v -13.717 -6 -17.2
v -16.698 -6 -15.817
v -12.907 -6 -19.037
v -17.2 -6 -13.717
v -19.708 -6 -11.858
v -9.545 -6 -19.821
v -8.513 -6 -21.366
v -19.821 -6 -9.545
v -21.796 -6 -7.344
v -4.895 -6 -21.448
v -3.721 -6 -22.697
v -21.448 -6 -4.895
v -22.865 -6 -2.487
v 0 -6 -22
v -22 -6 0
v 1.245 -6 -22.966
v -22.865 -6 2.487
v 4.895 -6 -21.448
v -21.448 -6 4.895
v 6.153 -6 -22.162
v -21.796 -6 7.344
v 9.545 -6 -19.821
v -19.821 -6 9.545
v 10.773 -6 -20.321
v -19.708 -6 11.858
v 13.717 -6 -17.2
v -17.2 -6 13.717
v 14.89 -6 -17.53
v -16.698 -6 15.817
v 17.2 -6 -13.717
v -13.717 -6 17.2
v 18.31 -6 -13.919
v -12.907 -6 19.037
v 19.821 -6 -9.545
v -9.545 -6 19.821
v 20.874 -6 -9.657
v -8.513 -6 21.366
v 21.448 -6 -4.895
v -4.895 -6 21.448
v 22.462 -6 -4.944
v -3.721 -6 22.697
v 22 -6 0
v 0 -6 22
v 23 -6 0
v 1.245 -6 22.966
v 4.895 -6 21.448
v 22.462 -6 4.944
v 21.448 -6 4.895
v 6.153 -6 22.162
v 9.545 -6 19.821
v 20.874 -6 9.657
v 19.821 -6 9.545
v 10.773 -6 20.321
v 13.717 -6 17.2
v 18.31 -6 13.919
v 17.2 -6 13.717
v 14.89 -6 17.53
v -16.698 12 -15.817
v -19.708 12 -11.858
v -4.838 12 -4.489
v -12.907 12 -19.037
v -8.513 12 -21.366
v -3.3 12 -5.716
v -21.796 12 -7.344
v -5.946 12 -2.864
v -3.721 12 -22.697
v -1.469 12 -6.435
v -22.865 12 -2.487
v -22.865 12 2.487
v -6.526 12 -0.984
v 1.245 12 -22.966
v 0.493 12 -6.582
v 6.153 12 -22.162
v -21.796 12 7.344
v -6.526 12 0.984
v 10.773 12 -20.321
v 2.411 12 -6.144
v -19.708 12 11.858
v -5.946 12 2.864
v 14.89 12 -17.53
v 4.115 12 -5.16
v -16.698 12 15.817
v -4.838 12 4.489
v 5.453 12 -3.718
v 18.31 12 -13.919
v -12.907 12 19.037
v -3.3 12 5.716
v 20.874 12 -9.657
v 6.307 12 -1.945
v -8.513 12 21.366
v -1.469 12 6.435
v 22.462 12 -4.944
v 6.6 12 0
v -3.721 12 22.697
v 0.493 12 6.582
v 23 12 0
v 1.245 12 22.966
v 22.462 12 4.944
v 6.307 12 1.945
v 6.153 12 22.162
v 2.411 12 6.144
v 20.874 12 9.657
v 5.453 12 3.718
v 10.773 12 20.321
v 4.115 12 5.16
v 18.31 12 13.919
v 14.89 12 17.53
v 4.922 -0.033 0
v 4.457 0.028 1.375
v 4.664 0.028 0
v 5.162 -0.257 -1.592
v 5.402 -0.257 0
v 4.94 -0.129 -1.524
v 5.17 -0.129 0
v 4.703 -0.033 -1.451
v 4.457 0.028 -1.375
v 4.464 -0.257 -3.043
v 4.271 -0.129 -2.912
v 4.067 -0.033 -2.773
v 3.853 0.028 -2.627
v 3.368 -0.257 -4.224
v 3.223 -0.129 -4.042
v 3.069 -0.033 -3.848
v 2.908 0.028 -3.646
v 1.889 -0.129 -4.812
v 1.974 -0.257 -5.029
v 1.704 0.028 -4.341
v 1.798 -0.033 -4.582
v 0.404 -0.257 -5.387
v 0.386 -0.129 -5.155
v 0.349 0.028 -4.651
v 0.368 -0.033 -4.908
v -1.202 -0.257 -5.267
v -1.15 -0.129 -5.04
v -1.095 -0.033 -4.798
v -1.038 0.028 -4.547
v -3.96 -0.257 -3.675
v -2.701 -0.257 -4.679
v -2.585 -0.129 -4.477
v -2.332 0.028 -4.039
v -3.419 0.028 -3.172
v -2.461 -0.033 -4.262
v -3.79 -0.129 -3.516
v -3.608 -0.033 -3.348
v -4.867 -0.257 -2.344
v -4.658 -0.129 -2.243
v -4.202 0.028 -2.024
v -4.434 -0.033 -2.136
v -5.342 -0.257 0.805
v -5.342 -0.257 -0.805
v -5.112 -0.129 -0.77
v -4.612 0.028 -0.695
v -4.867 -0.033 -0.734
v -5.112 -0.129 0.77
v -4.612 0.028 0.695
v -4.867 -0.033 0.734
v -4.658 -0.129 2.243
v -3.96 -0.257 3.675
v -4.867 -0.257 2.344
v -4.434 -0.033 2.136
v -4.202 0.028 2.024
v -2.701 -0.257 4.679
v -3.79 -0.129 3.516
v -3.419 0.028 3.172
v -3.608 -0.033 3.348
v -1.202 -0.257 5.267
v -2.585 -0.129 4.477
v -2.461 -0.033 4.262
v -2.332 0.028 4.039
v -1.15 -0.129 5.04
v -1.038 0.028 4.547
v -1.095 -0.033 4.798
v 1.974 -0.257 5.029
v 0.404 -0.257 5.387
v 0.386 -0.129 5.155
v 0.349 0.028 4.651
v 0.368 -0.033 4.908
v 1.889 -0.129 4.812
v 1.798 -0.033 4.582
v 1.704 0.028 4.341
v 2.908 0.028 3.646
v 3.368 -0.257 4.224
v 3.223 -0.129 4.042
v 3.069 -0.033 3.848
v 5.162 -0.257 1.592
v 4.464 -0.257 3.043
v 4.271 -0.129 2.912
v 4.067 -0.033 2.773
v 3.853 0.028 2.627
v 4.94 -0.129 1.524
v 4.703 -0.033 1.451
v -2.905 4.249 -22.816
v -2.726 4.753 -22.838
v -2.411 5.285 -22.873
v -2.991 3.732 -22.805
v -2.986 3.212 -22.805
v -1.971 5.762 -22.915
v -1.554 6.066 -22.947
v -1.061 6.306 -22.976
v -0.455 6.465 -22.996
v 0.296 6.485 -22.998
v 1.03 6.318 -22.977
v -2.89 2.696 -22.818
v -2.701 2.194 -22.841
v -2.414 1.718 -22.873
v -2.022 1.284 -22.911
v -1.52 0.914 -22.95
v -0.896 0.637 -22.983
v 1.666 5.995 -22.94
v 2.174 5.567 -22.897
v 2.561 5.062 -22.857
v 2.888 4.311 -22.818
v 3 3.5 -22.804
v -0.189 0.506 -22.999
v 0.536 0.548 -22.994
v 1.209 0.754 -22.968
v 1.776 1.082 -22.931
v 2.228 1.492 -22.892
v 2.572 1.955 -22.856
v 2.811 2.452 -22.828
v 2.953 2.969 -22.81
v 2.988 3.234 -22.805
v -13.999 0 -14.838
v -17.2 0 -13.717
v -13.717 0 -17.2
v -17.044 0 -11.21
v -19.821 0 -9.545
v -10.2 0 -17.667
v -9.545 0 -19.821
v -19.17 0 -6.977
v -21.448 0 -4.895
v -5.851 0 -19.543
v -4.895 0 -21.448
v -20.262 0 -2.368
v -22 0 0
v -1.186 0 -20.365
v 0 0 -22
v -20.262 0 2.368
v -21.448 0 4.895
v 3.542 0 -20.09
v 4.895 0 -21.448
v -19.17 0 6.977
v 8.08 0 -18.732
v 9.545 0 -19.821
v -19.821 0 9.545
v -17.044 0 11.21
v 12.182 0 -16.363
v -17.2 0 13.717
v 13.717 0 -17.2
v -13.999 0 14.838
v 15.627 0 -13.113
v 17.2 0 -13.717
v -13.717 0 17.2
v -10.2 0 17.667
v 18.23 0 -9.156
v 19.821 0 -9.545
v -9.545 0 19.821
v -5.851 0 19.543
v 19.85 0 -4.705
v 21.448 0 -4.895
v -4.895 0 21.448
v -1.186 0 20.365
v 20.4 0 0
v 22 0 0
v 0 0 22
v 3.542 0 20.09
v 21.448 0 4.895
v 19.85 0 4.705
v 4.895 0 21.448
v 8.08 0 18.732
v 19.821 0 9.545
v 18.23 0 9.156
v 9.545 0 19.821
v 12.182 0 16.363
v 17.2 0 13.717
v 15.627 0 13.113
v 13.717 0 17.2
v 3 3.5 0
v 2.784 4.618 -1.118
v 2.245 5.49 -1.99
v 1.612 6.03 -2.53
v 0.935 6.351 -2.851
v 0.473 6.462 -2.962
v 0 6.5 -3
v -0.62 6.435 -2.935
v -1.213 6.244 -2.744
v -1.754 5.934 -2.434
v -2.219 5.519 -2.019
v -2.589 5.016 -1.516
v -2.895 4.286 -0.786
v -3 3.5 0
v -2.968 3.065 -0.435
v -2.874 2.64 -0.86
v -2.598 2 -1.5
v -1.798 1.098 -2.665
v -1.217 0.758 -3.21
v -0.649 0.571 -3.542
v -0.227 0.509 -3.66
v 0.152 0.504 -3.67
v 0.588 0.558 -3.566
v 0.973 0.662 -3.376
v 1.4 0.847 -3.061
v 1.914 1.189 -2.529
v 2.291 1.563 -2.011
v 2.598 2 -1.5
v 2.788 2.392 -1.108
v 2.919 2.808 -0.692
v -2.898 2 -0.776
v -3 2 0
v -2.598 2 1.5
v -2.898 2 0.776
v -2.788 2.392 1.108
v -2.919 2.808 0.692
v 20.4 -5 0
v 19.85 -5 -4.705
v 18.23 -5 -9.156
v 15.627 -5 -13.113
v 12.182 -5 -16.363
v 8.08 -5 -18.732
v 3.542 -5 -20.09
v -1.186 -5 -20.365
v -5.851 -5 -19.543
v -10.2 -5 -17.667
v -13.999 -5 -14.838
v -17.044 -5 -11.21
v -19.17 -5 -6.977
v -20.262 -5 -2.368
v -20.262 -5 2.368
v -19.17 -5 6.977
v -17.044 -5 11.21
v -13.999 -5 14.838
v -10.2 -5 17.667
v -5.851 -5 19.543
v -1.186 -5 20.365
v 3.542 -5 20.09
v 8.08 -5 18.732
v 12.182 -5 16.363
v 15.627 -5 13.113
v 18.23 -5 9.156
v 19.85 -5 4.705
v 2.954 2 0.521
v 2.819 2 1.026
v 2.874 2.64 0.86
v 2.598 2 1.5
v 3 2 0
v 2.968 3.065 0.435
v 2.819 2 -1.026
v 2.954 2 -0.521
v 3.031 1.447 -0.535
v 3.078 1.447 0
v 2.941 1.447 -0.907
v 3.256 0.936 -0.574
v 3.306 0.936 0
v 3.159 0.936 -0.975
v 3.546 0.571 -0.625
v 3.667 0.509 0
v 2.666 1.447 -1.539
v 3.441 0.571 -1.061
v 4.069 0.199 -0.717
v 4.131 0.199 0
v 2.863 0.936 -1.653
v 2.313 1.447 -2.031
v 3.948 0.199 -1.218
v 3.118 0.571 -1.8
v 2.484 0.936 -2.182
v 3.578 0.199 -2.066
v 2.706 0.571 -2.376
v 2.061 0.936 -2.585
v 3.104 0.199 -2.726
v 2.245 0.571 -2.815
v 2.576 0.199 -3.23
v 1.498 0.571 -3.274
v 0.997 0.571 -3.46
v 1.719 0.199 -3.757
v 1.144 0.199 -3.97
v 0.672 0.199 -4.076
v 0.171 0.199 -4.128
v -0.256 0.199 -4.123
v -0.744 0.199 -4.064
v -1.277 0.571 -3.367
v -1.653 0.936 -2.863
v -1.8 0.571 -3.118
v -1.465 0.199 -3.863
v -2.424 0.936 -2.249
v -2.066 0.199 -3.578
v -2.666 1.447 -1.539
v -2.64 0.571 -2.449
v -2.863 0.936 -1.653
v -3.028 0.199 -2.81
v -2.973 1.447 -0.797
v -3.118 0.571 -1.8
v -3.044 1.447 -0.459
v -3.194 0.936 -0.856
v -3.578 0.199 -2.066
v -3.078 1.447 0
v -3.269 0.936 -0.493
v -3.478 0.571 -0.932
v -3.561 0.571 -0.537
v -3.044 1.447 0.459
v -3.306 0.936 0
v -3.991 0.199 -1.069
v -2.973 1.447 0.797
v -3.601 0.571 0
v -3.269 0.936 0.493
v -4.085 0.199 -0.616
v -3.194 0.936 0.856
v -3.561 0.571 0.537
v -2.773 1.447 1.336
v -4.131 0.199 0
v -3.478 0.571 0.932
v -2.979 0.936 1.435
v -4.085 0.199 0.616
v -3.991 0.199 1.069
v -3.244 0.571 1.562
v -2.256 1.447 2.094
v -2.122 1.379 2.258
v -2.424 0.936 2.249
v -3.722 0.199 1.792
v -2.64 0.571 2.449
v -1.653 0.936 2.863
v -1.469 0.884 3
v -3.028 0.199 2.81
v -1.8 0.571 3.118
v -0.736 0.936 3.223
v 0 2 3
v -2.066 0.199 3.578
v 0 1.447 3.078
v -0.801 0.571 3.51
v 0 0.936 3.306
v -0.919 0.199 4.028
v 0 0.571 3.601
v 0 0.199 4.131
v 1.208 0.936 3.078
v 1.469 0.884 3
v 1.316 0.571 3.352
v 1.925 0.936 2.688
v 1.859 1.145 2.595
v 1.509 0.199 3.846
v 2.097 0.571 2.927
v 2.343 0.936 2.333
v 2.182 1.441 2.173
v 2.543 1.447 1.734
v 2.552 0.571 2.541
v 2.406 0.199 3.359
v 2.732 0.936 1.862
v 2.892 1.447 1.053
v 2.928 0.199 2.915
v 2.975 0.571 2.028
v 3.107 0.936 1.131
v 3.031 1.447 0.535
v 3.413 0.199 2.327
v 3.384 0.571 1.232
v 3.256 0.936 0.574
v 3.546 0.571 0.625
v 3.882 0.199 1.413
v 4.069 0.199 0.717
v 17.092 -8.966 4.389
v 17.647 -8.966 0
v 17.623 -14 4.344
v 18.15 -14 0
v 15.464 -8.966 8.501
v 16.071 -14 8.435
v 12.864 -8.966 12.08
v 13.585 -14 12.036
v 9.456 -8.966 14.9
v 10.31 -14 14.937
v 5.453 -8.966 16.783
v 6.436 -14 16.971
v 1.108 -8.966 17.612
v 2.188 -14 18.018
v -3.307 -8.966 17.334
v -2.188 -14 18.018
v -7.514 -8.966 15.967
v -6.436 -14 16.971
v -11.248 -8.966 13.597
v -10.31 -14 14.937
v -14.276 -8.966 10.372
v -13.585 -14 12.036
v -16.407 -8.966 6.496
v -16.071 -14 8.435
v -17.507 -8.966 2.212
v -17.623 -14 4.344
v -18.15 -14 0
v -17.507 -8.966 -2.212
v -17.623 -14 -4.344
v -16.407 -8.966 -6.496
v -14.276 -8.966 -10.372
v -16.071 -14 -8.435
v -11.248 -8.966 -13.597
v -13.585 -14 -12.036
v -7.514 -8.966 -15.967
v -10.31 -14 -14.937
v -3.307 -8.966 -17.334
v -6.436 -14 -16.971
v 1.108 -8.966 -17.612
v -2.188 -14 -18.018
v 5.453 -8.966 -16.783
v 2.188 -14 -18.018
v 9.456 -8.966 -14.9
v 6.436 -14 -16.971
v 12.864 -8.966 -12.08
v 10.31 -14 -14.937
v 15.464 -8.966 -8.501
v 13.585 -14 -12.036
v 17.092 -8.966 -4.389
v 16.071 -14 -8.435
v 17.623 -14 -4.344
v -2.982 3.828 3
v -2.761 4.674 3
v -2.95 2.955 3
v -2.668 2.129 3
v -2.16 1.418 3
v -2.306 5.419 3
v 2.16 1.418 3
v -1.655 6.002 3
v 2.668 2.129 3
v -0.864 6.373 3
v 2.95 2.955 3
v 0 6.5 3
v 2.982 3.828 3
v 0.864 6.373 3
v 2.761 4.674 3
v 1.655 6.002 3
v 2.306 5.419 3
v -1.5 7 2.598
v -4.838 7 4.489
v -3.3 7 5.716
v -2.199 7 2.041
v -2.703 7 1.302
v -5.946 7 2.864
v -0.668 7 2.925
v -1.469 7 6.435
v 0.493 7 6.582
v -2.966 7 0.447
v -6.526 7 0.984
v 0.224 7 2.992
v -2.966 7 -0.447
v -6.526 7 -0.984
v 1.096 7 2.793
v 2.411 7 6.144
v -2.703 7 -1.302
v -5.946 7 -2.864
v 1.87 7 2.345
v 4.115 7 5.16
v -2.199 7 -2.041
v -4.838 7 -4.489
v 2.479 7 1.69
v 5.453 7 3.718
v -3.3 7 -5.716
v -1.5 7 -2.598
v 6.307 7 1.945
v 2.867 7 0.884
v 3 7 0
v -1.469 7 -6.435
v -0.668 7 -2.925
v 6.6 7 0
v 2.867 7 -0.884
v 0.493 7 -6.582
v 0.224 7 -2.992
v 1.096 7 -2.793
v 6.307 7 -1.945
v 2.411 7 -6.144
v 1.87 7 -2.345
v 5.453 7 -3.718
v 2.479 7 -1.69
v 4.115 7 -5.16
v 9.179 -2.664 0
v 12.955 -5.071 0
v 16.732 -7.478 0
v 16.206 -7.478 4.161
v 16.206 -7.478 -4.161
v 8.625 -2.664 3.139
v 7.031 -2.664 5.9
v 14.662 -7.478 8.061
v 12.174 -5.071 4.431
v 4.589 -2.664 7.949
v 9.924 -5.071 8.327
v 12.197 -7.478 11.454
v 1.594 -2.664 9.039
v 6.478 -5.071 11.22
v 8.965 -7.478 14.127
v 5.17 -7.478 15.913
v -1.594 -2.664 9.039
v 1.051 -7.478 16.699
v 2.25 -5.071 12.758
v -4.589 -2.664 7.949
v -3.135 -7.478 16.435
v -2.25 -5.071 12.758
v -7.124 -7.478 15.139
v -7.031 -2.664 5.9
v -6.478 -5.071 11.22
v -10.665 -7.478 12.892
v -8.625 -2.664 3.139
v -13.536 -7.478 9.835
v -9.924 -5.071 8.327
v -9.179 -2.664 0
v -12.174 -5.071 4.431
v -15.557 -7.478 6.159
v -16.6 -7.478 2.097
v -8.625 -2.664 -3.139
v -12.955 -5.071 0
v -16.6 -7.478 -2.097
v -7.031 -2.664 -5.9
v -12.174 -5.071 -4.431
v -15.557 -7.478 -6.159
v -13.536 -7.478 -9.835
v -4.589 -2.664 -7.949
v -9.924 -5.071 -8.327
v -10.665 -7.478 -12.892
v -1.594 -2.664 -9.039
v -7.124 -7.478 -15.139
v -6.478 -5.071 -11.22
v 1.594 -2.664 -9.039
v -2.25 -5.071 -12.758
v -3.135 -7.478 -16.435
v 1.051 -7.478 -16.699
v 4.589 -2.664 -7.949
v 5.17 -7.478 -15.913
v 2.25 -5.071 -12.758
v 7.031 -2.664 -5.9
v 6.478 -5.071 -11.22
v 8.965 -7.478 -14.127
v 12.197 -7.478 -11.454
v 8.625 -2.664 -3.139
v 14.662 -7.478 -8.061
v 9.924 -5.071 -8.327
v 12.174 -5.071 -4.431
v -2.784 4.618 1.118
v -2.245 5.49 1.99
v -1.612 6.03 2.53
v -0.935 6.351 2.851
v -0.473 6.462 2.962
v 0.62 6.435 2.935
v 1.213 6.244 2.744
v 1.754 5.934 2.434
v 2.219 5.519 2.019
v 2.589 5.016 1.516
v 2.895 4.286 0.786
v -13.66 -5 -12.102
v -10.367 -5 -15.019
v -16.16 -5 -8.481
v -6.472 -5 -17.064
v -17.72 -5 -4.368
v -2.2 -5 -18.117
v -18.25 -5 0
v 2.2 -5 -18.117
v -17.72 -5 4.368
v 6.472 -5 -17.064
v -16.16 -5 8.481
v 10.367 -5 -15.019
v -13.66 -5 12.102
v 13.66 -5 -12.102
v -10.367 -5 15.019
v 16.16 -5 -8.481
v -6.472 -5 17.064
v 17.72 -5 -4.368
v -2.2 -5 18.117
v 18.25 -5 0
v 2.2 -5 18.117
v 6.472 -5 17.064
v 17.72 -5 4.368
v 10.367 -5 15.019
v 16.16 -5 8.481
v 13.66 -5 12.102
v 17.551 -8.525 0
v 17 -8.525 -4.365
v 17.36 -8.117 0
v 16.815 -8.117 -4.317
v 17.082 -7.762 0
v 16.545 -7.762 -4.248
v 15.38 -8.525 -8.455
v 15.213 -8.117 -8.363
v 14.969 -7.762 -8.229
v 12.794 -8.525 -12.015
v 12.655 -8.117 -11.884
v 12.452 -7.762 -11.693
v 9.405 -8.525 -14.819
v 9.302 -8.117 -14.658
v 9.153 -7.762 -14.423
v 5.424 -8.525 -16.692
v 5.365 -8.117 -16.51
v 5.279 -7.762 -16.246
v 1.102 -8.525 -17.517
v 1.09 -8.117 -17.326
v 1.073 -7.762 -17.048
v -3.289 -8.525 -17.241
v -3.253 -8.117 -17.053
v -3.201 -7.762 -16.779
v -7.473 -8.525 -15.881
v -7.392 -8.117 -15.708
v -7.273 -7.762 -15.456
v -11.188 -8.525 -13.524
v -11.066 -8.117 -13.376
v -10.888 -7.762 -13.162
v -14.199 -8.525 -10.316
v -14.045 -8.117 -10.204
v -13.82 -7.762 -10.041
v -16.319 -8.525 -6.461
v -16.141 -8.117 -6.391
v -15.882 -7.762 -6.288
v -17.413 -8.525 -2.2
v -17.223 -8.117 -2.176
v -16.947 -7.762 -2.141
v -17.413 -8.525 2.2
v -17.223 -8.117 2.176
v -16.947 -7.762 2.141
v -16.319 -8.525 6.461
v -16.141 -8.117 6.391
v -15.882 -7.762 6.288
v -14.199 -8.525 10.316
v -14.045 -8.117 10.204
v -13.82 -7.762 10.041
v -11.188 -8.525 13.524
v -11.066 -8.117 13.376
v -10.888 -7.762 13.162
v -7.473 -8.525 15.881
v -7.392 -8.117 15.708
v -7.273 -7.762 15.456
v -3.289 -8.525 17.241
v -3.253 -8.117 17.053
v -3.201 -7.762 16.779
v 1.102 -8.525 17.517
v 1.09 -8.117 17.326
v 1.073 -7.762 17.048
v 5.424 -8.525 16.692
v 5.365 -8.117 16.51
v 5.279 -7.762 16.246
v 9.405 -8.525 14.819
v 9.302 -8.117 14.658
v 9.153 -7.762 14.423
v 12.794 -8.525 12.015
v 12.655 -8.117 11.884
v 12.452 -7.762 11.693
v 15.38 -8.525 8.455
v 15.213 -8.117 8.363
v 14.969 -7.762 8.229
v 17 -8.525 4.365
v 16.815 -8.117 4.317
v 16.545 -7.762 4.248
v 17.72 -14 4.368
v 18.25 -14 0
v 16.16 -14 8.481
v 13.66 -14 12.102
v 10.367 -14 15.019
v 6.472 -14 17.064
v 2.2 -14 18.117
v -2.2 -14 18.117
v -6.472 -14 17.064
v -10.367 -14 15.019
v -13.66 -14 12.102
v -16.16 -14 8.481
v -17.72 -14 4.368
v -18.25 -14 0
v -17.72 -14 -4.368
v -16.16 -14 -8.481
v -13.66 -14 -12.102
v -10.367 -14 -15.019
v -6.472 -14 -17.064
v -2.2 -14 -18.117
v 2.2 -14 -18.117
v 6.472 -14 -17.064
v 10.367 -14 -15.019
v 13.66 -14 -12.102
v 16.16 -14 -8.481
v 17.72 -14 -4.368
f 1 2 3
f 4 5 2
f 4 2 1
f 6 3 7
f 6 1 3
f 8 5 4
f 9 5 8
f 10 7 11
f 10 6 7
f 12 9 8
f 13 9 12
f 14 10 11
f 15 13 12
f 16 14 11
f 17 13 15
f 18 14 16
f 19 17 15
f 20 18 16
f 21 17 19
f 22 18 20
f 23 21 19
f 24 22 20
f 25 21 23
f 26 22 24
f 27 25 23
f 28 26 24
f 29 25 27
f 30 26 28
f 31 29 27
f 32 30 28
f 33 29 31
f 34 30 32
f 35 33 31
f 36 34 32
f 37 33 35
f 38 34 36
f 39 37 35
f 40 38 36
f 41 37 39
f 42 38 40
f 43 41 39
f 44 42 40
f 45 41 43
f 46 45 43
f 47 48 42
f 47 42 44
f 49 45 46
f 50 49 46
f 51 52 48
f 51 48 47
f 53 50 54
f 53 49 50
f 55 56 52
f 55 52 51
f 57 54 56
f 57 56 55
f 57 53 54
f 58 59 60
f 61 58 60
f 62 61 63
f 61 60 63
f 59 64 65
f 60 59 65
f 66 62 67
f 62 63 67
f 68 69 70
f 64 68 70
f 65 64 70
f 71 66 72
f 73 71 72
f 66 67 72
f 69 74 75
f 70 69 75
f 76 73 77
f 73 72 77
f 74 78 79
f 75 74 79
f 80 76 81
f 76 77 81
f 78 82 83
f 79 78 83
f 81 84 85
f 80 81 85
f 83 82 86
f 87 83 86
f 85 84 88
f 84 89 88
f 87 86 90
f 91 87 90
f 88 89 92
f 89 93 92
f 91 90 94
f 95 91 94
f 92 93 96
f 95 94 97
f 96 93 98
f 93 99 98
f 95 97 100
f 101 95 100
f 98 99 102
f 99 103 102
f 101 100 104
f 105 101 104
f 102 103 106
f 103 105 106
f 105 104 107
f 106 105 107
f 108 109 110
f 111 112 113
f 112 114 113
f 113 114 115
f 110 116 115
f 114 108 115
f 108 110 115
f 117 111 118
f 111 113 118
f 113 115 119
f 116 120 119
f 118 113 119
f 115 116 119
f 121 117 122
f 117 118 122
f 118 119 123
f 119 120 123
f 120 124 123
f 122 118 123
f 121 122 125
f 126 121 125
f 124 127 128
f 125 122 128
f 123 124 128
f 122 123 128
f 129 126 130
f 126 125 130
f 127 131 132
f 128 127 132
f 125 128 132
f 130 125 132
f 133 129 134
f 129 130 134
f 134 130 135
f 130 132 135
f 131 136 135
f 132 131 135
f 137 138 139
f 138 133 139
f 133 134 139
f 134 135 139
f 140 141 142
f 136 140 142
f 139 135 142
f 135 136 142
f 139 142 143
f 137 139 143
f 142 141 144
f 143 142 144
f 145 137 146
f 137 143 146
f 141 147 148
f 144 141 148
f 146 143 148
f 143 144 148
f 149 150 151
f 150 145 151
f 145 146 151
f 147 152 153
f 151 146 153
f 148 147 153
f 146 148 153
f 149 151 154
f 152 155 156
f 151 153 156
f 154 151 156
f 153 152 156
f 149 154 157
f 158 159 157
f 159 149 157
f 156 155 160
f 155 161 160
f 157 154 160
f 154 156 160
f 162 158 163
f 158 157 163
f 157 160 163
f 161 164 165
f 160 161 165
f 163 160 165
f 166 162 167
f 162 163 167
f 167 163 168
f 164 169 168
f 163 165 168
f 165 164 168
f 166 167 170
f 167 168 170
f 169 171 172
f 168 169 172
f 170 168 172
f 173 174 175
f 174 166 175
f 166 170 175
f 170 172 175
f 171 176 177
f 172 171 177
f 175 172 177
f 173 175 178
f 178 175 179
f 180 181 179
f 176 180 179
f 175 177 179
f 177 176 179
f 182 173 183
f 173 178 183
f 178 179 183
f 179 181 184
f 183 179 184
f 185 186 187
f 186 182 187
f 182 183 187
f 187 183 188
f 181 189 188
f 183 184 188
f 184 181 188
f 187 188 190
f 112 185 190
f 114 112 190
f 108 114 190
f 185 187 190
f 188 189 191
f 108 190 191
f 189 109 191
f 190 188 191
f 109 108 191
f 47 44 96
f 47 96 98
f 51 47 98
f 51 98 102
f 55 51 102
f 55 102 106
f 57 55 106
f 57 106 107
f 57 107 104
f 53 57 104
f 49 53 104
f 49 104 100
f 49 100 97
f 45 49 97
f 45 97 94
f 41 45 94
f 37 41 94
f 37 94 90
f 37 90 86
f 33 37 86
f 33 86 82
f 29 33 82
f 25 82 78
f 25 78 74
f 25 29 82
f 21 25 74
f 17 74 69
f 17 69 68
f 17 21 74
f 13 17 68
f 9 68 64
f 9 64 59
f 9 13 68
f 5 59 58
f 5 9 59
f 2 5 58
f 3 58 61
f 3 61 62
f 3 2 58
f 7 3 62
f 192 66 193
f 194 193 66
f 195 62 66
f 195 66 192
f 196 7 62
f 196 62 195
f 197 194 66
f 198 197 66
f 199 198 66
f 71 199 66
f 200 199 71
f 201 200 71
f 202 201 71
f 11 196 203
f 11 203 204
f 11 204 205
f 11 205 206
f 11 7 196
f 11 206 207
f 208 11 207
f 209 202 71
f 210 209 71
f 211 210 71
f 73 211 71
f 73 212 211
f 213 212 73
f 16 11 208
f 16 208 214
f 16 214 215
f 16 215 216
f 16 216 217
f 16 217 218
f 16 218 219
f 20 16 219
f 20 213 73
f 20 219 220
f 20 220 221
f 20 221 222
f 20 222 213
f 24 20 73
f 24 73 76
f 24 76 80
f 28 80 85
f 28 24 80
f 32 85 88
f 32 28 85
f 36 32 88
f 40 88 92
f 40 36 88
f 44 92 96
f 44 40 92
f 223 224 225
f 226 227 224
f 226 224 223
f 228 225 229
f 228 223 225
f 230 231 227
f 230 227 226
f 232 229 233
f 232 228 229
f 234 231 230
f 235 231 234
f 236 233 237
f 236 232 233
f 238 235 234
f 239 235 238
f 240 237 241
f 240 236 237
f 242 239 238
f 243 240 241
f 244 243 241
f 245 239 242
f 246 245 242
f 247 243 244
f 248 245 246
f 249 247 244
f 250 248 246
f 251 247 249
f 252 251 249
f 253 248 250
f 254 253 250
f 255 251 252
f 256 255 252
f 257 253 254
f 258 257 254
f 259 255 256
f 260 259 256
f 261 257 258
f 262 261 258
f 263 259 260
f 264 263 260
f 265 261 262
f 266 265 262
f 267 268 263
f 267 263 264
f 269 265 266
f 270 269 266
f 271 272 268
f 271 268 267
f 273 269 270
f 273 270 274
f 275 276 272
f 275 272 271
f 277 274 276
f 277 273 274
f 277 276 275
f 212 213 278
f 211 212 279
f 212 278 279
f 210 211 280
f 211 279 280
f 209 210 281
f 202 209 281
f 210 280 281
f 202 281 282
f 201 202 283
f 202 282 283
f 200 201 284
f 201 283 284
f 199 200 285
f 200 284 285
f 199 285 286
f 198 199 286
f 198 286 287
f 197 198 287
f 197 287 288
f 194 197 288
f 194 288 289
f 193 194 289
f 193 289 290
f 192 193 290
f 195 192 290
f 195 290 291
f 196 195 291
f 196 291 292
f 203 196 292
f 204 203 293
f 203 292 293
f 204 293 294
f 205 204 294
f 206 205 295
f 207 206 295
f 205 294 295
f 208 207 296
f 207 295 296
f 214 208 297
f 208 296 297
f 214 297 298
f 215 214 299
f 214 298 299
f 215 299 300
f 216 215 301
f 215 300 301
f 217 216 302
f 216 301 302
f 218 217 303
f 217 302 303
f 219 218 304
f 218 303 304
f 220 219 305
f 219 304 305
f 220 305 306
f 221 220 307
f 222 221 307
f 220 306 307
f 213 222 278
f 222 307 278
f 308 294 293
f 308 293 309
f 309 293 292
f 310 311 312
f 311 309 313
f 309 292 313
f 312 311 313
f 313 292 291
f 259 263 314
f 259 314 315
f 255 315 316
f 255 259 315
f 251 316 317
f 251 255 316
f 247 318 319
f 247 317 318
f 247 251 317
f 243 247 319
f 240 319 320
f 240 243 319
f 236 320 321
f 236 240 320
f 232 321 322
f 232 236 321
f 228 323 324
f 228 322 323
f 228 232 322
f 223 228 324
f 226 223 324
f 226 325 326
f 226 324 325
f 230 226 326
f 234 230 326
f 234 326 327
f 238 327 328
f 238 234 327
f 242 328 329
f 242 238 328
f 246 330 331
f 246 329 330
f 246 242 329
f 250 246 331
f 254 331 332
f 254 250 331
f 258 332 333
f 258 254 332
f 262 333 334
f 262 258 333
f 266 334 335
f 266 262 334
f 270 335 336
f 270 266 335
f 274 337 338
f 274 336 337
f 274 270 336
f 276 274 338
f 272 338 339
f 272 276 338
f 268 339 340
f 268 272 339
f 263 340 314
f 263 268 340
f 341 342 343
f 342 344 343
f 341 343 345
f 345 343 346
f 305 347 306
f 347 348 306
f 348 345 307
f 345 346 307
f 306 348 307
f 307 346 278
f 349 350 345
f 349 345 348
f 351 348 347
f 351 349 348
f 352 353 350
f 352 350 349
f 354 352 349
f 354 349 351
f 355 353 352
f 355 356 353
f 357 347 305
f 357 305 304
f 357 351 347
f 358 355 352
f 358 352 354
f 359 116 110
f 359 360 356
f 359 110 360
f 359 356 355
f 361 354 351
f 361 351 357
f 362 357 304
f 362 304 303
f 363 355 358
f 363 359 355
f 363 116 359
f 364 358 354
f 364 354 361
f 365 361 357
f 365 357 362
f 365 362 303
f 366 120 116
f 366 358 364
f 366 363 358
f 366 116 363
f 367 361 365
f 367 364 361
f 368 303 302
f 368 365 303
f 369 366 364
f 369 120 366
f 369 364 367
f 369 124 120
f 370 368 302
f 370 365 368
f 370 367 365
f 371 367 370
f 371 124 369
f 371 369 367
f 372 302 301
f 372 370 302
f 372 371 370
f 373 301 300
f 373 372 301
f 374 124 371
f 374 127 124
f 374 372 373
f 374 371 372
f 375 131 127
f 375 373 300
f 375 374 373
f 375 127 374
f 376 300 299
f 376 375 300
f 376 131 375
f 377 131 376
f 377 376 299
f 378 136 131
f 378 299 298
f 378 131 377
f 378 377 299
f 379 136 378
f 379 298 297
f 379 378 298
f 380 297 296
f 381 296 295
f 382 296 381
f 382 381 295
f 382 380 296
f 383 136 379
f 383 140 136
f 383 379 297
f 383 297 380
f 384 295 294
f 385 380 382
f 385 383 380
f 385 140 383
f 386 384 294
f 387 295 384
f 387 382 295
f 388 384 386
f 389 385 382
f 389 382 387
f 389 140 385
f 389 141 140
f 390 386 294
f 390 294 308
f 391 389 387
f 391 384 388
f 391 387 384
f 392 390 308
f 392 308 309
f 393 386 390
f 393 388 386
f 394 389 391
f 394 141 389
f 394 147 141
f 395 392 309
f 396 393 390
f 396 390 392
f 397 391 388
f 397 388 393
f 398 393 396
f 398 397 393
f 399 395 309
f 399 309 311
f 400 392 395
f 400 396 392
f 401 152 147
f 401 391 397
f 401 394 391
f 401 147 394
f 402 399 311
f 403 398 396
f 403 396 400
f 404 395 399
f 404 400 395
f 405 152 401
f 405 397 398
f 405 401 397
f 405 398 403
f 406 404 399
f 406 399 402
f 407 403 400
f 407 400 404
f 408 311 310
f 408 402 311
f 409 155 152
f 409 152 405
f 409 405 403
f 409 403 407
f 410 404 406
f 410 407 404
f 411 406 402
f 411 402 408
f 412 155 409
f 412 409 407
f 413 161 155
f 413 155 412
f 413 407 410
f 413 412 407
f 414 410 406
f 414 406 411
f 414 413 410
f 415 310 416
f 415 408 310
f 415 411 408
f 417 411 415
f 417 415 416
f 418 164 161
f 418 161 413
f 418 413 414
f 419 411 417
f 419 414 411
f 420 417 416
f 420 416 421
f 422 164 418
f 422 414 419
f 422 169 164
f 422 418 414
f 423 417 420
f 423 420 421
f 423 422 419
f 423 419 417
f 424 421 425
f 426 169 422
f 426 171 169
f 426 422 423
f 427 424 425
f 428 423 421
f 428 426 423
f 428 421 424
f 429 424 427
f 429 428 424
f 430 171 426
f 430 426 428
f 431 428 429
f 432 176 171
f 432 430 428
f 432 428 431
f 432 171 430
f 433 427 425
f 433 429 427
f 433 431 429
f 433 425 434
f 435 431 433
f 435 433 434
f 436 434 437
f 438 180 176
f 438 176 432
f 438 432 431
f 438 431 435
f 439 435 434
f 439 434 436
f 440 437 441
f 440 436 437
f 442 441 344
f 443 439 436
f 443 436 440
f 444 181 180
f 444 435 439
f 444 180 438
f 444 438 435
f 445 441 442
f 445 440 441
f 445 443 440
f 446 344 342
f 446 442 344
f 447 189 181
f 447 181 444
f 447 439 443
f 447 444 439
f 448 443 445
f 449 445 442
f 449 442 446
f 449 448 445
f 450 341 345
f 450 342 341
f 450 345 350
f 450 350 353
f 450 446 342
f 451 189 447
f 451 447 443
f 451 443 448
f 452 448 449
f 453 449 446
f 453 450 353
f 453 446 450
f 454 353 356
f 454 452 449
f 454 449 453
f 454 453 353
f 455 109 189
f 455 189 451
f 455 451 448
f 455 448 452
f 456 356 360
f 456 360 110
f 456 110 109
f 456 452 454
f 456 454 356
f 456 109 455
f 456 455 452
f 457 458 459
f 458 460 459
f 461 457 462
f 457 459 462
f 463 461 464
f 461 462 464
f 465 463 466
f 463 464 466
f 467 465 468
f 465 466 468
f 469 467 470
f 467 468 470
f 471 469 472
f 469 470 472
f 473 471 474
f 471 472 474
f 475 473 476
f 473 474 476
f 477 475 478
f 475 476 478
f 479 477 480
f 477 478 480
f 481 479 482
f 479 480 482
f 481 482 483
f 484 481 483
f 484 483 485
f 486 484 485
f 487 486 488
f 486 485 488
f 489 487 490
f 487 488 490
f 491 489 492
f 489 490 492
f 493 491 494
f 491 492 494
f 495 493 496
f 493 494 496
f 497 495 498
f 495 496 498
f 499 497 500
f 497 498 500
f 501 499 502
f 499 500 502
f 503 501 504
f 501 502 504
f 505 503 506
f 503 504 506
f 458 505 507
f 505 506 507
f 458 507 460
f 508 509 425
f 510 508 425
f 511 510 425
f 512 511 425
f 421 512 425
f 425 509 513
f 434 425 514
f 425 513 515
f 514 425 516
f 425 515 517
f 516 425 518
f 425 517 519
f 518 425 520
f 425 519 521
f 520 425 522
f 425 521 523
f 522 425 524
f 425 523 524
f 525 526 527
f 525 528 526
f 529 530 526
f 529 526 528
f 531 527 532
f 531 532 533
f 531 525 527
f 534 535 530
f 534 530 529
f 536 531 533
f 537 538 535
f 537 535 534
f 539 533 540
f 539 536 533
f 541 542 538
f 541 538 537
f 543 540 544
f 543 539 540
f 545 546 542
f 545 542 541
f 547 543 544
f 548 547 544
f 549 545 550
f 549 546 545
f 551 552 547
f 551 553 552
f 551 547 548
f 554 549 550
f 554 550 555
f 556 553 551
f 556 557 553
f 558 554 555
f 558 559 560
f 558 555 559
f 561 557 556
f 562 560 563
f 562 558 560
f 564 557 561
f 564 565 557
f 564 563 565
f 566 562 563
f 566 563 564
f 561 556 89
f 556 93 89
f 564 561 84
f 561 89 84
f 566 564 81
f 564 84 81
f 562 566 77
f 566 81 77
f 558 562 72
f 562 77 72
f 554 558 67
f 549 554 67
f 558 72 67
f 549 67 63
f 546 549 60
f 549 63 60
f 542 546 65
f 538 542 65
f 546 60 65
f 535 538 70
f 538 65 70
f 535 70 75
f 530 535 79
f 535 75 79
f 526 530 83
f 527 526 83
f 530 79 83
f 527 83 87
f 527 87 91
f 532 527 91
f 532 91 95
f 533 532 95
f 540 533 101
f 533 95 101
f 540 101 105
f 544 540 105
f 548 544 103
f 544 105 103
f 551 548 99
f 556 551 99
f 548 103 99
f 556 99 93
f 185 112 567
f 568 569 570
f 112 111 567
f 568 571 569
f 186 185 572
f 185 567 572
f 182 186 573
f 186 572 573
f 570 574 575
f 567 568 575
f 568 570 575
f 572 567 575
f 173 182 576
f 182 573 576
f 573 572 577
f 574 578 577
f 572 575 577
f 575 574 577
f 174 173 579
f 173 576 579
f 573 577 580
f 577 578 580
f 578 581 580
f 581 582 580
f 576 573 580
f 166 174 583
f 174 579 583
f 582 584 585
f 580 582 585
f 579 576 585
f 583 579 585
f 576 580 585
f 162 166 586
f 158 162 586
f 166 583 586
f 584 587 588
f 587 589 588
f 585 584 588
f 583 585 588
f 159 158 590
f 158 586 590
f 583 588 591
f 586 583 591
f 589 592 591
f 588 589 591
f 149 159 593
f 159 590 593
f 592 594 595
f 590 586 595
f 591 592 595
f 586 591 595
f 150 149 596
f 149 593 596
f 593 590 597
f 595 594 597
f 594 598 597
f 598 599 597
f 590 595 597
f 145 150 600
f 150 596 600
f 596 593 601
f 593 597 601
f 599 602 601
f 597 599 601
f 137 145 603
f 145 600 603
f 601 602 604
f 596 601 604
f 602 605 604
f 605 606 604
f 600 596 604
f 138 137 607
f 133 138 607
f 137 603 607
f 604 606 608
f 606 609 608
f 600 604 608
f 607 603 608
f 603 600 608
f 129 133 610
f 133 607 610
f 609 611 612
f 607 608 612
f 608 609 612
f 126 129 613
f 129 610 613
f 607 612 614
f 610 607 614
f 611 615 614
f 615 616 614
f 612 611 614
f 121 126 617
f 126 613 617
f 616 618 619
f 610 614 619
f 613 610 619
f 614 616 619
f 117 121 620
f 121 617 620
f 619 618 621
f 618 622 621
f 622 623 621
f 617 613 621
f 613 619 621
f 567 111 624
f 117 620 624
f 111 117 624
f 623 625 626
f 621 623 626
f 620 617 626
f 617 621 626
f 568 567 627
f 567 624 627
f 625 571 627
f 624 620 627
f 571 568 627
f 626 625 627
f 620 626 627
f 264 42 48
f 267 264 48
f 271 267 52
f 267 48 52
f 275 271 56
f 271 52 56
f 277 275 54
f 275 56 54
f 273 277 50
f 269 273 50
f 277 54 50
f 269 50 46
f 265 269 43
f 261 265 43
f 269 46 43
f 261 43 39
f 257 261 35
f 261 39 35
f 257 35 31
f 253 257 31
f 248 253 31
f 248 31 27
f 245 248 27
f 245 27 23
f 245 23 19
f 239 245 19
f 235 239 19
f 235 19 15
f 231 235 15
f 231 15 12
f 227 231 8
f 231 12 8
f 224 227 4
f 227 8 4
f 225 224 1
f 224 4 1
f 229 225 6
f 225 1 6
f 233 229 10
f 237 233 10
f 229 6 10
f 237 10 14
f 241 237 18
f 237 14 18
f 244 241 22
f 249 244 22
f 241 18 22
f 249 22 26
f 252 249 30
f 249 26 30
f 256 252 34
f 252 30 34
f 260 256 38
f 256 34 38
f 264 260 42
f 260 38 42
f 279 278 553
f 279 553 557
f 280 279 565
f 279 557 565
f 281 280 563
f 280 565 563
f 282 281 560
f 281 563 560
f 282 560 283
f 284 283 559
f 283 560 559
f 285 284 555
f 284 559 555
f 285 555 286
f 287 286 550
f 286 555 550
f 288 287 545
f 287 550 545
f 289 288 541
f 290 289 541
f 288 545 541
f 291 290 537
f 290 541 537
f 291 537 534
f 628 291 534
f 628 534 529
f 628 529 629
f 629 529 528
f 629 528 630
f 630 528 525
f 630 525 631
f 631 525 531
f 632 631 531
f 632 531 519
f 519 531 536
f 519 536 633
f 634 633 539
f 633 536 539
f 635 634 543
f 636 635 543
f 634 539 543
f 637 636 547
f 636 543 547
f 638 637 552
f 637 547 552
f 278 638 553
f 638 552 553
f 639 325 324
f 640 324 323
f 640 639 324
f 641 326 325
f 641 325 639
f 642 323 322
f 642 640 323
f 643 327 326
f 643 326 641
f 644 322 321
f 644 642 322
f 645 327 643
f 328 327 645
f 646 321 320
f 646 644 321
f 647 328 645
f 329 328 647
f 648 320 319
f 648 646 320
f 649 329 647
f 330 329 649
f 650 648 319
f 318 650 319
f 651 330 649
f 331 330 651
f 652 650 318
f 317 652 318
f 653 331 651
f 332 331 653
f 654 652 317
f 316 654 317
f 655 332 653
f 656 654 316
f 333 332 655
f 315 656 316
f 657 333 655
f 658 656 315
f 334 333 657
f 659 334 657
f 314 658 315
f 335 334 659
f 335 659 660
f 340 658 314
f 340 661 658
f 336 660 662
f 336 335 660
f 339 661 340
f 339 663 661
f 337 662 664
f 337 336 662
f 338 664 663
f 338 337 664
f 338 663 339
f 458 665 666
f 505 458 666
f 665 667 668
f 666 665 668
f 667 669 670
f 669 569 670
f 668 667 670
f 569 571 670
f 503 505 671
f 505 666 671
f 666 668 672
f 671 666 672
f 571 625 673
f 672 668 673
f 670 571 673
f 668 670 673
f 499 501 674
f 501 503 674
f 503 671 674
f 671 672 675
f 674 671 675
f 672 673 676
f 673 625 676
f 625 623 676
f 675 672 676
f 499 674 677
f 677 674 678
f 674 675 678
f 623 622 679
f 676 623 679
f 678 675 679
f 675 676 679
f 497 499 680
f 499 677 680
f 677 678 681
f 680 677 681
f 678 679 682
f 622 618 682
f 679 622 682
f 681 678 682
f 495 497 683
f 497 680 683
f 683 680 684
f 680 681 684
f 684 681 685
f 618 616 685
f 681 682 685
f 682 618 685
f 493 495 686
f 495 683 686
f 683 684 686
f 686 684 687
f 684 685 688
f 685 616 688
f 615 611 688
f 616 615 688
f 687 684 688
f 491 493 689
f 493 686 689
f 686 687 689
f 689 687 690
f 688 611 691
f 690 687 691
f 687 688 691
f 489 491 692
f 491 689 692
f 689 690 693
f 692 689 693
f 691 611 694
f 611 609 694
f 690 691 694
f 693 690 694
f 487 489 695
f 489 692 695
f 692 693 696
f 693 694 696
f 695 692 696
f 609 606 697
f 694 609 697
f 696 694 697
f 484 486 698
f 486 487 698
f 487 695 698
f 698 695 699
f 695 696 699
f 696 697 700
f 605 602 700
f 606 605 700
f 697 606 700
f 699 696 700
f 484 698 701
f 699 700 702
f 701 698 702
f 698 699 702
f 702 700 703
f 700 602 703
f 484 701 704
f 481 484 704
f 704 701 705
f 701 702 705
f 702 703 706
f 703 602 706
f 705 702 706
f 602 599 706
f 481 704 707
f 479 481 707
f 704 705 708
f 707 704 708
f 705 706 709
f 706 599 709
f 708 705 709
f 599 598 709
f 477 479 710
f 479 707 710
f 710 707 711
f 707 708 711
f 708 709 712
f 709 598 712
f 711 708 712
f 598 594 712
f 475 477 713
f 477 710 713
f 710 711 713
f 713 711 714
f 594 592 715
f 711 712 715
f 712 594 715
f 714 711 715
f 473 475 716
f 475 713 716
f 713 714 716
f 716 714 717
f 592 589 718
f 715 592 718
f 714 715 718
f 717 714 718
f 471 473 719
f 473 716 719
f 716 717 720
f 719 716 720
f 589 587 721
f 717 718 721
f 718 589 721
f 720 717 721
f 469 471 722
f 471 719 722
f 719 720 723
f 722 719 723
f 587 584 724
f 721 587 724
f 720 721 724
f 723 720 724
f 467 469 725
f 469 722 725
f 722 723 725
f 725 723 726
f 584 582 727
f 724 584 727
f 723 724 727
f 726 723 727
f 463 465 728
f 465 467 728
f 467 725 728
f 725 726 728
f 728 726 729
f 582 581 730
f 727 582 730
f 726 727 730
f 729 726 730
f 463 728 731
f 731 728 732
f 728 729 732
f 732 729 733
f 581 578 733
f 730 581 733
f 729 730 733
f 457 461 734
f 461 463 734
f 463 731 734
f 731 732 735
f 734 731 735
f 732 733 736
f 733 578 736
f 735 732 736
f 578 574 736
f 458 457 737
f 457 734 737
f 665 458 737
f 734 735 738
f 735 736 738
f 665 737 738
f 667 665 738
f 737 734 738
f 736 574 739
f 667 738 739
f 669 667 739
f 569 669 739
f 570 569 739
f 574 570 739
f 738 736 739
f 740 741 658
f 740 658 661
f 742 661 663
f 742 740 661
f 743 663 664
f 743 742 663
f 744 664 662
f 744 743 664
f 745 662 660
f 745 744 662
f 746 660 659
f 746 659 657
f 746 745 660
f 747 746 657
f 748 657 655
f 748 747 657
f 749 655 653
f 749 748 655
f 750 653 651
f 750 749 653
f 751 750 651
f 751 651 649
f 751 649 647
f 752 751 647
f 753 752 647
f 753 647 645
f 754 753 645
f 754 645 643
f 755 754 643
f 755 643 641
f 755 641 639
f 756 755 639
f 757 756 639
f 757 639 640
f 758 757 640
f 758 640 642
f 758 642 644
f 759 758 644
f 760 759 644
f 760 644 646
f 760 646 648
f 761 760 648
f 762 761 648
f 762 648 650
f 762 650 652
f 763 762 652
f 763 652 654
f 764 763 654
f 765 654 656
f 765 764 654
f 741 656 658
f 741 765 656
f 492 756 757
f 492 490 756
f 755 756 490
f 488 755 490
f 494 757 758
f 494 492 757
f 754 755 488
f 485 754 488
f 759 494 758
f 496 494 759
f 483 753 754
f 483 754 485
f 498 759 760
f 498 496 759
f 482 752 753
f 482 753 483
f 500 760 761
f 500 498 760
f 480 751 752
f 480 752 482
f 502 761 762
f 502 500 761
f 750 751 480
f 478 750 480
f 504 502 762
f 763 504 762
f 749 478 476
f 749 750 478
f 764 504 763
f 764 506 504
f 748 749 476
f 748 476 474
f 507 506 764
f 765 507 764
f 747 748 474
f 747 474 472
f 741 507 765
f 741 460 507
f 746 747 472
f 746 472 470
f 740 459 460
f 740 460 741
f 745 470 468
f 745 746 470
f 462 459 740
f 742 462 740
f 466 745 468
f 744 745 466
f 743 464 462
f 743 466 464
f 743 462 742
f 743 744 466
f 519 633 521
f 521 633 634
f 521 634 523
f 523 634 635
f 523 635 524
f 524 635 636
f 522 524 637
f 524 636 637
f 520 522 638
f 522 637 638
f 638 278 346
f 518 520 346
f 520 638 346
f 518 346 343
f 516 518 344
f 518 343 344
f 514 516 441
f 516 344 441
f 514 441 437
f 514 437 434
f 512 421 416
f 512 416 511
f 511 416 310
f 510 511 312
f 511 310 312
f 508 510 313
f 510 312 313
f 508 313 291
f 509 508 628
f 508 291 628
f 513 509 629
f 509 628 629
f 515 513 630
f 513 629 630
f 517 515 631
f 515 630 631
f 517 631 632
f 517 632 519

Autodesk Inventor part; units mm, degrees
ref_plane "YZ Plane" through (0, 0, 0) normal (1, 0, 0) x (0, 1, 0)
ref_plane "XZ Plane" through (0, 0, 0) normal (0, 1, 0) x (-1, 0, 0)
ref_plane "XY Plane" through (0, 0, 0) normal (0, 0, 1) x (1, 0, 0)
sketch "Sketch1" plane through (0, 0, 0) normal (0, 0, 1) x (1, 0, 0)
  line L0 (3, 12) -> (23, 12)
  line L1 (23, 12) -> (23, 0)
  line L2 (3, 2) -> (3, 12)
  line L3 (0, 19.5472) -> (0, -22.4151)
  line L4 (23, 0) -> (22, 0) construction
  line L5 (22, 0) -> (22, -6)
  line L6 (22, -6) -> (23, -6)
  line L7 (23, -6) -> (23, 0)
  line L8 (20.4, 0) -> (17.25, 0) construction
  line L9 (17.25, 0) -> (17.25, -5) construction
  line L10 (17.25, -5) -> (20.4, -5) construction
  line L11 (20.4, -5) -> (20.4, 0)
  arc A0 (3, 2) -> (4.6637, 0.0285) centre (5, 2) ccw
  line L12 (22, 0) -> (20.4, 0)
  line L13 (17.25, 0) -> (5, 0)
  line L14 (-20.0393, 0) -> (22, 0) construction
  line L15 (23, 0) -> (24.5476, 0) construction
  line L16 (18.25, 0) -> (18.25, -5) construction
  line L17 (20.4, -5) -> (18.25, -5)
  line L18 (18.25, -5) -> (18.25, -14)
  line L19 (18.25, -14) -> (18.15, -14)
  line L20 (18.15, -14) -> (17.25, -5) construction
  line L21 (18.25, -8) -> (17.55, -8) construction
  line L22 (5.4025, -0.2566) -> (16.7316, -7.4783)
  line L23 (17.6466, -8.9658) -> (18.15, -14)
  arc A1 (17.6466, -8.9658) -> (16.7316, -7.4783) centre (15.6565, -9.1648) ccw
  arc A2 (5.4025, -0.2566) -> (4.6637, 0.0285) centre (4.3274, -1.943) ccw
  point P0 (0, 0)
  point P1 (17.25, 0)
  point P2 (17.25, -5)
  point P3 (5, 0)
  point P4 (17.9, -8)
  dimension "d0" = 6
  dimension "d2" = 1
  dimension "d5" = 5
  dimension "d6" = 1.6
  dimension "d7" = 44
  dimension "d11" = 2
  dimension "d12" = 12
  dimension "d14" = 6
  dimension "d23" = 36.5
  dimension "d24" = 1
  dimension "d25" = 0.1
  dimension "d26" = 9
  dimension "d37" = 3
  dimension "d38" = 2
  dimension "d39" = 2
revolve "Revolution1" add sketch "Sketch1" angle 360 about axis through (0, 19.5472, 0) along (0, -1, 0)
sketch "Sketch2" plane through (0, 0, 0) normal (0, 0, 1) x (1, 0, 0)
  line L0 (-3, 12) -> (3, 12) projected
  line L1 (0, 12) -> (0, 0) construction
  line L2 (-3, 2) -> (3, 2) construction
  circle A0 centre (0, 3.5) radius 3
  line L3 (-20.4, 0) -> (20.4, 0) projected
  point P0 (2.5981, 2)
  point P1 (-2.5981, 2)
  dimension "d0" = 6
  dimension "d16" = 6
  dimension "d40" = 3.5
extrude "Extrusion1" cut sketch "Sketch2" along normal blind 3 and the other way blind 33
sketch "Sketch3" plane through (0, 12, 0) normal (0, 1, 0) x (1, 0, 0)
  circle A0 centre (0, 0) radius 6.6
  circle A1 centre (0, 0) radius 3 construction
  dimension "d0" = 6
  dimension "d27" = 13.2
extrude "Extrusion2" cut sketch "Sketch3" against normal blind 5
equation "\"d0\" = t_D"
equation "\"d2\" = w_th"
equation "\"d5\" = b_rim_h"
equation "\"d6\" = lv_th"
equation "\"d7\" = b_OD"
equation "\"d11\" = fillet_D"
equation "\"d12\" = top_th_f"
equation "\"d14\" = w_l"
equation "\"d23\" = b_ID"
equation "\"d24\" = w_th"
equation "\"d25\" = tol"
equation "\"d26\" = 1.5 * w_l"
equation "\"d37\" = 0.5 * w_l"
equation "\"d38\" = fillet_D"
equation "\"d39\" = fillet_D"
equation "\"d16\" = t_D"
equation "\"d40\" = 0.5 * w_th + 0.5 * t_D"
equation "\"d18\" = 0.5 * t_D"
equation "\"d19\" = 0.75 * b_OD"
equation "\"d27\" = cn_D"
equation "\"d30\" = cn_h"
equation "\"tol\" = 0.1"
equation "\"fillet_D\" = 2"
equation "\"w_th\" = 1"
equation "\"w_l\" = 6"
equation "\"t_D\" = 6"
equation "\"t_D_f\" = t_D + w_th"
equation "\"top_th_f\" = t_D_f + cn_h"
equation "\"cn_h\" = 5"
equation "\"lv_th\" = 1.6"
equation "\"d3\" = w_l"
equation "\"d8\" = top_th_f"
equation "\"b_ID\" = 36.5"
equation "\"b_OD\" = 44"
equation "\"b_rim_h\" = 5"
equation "\"top_th\" = t_D + w_th"
equation "\"lv_OD\" = 26"
equation "\"sv_OD\" = 13"
equation "\"sv_th\" = 1.5"
equation "\"b_th\" = 1.5"
equation "\"h_s\" = 2.25"
equation "\"h_D\" = 0.9"
equation "\"v_h_D\" = 7.5"
equation "\"v_h_off\" = 0.5 * cn_D + 0.5 * v_h_D"
equation "\"cn_D\" = 13.2"
properties part number "bottle"
